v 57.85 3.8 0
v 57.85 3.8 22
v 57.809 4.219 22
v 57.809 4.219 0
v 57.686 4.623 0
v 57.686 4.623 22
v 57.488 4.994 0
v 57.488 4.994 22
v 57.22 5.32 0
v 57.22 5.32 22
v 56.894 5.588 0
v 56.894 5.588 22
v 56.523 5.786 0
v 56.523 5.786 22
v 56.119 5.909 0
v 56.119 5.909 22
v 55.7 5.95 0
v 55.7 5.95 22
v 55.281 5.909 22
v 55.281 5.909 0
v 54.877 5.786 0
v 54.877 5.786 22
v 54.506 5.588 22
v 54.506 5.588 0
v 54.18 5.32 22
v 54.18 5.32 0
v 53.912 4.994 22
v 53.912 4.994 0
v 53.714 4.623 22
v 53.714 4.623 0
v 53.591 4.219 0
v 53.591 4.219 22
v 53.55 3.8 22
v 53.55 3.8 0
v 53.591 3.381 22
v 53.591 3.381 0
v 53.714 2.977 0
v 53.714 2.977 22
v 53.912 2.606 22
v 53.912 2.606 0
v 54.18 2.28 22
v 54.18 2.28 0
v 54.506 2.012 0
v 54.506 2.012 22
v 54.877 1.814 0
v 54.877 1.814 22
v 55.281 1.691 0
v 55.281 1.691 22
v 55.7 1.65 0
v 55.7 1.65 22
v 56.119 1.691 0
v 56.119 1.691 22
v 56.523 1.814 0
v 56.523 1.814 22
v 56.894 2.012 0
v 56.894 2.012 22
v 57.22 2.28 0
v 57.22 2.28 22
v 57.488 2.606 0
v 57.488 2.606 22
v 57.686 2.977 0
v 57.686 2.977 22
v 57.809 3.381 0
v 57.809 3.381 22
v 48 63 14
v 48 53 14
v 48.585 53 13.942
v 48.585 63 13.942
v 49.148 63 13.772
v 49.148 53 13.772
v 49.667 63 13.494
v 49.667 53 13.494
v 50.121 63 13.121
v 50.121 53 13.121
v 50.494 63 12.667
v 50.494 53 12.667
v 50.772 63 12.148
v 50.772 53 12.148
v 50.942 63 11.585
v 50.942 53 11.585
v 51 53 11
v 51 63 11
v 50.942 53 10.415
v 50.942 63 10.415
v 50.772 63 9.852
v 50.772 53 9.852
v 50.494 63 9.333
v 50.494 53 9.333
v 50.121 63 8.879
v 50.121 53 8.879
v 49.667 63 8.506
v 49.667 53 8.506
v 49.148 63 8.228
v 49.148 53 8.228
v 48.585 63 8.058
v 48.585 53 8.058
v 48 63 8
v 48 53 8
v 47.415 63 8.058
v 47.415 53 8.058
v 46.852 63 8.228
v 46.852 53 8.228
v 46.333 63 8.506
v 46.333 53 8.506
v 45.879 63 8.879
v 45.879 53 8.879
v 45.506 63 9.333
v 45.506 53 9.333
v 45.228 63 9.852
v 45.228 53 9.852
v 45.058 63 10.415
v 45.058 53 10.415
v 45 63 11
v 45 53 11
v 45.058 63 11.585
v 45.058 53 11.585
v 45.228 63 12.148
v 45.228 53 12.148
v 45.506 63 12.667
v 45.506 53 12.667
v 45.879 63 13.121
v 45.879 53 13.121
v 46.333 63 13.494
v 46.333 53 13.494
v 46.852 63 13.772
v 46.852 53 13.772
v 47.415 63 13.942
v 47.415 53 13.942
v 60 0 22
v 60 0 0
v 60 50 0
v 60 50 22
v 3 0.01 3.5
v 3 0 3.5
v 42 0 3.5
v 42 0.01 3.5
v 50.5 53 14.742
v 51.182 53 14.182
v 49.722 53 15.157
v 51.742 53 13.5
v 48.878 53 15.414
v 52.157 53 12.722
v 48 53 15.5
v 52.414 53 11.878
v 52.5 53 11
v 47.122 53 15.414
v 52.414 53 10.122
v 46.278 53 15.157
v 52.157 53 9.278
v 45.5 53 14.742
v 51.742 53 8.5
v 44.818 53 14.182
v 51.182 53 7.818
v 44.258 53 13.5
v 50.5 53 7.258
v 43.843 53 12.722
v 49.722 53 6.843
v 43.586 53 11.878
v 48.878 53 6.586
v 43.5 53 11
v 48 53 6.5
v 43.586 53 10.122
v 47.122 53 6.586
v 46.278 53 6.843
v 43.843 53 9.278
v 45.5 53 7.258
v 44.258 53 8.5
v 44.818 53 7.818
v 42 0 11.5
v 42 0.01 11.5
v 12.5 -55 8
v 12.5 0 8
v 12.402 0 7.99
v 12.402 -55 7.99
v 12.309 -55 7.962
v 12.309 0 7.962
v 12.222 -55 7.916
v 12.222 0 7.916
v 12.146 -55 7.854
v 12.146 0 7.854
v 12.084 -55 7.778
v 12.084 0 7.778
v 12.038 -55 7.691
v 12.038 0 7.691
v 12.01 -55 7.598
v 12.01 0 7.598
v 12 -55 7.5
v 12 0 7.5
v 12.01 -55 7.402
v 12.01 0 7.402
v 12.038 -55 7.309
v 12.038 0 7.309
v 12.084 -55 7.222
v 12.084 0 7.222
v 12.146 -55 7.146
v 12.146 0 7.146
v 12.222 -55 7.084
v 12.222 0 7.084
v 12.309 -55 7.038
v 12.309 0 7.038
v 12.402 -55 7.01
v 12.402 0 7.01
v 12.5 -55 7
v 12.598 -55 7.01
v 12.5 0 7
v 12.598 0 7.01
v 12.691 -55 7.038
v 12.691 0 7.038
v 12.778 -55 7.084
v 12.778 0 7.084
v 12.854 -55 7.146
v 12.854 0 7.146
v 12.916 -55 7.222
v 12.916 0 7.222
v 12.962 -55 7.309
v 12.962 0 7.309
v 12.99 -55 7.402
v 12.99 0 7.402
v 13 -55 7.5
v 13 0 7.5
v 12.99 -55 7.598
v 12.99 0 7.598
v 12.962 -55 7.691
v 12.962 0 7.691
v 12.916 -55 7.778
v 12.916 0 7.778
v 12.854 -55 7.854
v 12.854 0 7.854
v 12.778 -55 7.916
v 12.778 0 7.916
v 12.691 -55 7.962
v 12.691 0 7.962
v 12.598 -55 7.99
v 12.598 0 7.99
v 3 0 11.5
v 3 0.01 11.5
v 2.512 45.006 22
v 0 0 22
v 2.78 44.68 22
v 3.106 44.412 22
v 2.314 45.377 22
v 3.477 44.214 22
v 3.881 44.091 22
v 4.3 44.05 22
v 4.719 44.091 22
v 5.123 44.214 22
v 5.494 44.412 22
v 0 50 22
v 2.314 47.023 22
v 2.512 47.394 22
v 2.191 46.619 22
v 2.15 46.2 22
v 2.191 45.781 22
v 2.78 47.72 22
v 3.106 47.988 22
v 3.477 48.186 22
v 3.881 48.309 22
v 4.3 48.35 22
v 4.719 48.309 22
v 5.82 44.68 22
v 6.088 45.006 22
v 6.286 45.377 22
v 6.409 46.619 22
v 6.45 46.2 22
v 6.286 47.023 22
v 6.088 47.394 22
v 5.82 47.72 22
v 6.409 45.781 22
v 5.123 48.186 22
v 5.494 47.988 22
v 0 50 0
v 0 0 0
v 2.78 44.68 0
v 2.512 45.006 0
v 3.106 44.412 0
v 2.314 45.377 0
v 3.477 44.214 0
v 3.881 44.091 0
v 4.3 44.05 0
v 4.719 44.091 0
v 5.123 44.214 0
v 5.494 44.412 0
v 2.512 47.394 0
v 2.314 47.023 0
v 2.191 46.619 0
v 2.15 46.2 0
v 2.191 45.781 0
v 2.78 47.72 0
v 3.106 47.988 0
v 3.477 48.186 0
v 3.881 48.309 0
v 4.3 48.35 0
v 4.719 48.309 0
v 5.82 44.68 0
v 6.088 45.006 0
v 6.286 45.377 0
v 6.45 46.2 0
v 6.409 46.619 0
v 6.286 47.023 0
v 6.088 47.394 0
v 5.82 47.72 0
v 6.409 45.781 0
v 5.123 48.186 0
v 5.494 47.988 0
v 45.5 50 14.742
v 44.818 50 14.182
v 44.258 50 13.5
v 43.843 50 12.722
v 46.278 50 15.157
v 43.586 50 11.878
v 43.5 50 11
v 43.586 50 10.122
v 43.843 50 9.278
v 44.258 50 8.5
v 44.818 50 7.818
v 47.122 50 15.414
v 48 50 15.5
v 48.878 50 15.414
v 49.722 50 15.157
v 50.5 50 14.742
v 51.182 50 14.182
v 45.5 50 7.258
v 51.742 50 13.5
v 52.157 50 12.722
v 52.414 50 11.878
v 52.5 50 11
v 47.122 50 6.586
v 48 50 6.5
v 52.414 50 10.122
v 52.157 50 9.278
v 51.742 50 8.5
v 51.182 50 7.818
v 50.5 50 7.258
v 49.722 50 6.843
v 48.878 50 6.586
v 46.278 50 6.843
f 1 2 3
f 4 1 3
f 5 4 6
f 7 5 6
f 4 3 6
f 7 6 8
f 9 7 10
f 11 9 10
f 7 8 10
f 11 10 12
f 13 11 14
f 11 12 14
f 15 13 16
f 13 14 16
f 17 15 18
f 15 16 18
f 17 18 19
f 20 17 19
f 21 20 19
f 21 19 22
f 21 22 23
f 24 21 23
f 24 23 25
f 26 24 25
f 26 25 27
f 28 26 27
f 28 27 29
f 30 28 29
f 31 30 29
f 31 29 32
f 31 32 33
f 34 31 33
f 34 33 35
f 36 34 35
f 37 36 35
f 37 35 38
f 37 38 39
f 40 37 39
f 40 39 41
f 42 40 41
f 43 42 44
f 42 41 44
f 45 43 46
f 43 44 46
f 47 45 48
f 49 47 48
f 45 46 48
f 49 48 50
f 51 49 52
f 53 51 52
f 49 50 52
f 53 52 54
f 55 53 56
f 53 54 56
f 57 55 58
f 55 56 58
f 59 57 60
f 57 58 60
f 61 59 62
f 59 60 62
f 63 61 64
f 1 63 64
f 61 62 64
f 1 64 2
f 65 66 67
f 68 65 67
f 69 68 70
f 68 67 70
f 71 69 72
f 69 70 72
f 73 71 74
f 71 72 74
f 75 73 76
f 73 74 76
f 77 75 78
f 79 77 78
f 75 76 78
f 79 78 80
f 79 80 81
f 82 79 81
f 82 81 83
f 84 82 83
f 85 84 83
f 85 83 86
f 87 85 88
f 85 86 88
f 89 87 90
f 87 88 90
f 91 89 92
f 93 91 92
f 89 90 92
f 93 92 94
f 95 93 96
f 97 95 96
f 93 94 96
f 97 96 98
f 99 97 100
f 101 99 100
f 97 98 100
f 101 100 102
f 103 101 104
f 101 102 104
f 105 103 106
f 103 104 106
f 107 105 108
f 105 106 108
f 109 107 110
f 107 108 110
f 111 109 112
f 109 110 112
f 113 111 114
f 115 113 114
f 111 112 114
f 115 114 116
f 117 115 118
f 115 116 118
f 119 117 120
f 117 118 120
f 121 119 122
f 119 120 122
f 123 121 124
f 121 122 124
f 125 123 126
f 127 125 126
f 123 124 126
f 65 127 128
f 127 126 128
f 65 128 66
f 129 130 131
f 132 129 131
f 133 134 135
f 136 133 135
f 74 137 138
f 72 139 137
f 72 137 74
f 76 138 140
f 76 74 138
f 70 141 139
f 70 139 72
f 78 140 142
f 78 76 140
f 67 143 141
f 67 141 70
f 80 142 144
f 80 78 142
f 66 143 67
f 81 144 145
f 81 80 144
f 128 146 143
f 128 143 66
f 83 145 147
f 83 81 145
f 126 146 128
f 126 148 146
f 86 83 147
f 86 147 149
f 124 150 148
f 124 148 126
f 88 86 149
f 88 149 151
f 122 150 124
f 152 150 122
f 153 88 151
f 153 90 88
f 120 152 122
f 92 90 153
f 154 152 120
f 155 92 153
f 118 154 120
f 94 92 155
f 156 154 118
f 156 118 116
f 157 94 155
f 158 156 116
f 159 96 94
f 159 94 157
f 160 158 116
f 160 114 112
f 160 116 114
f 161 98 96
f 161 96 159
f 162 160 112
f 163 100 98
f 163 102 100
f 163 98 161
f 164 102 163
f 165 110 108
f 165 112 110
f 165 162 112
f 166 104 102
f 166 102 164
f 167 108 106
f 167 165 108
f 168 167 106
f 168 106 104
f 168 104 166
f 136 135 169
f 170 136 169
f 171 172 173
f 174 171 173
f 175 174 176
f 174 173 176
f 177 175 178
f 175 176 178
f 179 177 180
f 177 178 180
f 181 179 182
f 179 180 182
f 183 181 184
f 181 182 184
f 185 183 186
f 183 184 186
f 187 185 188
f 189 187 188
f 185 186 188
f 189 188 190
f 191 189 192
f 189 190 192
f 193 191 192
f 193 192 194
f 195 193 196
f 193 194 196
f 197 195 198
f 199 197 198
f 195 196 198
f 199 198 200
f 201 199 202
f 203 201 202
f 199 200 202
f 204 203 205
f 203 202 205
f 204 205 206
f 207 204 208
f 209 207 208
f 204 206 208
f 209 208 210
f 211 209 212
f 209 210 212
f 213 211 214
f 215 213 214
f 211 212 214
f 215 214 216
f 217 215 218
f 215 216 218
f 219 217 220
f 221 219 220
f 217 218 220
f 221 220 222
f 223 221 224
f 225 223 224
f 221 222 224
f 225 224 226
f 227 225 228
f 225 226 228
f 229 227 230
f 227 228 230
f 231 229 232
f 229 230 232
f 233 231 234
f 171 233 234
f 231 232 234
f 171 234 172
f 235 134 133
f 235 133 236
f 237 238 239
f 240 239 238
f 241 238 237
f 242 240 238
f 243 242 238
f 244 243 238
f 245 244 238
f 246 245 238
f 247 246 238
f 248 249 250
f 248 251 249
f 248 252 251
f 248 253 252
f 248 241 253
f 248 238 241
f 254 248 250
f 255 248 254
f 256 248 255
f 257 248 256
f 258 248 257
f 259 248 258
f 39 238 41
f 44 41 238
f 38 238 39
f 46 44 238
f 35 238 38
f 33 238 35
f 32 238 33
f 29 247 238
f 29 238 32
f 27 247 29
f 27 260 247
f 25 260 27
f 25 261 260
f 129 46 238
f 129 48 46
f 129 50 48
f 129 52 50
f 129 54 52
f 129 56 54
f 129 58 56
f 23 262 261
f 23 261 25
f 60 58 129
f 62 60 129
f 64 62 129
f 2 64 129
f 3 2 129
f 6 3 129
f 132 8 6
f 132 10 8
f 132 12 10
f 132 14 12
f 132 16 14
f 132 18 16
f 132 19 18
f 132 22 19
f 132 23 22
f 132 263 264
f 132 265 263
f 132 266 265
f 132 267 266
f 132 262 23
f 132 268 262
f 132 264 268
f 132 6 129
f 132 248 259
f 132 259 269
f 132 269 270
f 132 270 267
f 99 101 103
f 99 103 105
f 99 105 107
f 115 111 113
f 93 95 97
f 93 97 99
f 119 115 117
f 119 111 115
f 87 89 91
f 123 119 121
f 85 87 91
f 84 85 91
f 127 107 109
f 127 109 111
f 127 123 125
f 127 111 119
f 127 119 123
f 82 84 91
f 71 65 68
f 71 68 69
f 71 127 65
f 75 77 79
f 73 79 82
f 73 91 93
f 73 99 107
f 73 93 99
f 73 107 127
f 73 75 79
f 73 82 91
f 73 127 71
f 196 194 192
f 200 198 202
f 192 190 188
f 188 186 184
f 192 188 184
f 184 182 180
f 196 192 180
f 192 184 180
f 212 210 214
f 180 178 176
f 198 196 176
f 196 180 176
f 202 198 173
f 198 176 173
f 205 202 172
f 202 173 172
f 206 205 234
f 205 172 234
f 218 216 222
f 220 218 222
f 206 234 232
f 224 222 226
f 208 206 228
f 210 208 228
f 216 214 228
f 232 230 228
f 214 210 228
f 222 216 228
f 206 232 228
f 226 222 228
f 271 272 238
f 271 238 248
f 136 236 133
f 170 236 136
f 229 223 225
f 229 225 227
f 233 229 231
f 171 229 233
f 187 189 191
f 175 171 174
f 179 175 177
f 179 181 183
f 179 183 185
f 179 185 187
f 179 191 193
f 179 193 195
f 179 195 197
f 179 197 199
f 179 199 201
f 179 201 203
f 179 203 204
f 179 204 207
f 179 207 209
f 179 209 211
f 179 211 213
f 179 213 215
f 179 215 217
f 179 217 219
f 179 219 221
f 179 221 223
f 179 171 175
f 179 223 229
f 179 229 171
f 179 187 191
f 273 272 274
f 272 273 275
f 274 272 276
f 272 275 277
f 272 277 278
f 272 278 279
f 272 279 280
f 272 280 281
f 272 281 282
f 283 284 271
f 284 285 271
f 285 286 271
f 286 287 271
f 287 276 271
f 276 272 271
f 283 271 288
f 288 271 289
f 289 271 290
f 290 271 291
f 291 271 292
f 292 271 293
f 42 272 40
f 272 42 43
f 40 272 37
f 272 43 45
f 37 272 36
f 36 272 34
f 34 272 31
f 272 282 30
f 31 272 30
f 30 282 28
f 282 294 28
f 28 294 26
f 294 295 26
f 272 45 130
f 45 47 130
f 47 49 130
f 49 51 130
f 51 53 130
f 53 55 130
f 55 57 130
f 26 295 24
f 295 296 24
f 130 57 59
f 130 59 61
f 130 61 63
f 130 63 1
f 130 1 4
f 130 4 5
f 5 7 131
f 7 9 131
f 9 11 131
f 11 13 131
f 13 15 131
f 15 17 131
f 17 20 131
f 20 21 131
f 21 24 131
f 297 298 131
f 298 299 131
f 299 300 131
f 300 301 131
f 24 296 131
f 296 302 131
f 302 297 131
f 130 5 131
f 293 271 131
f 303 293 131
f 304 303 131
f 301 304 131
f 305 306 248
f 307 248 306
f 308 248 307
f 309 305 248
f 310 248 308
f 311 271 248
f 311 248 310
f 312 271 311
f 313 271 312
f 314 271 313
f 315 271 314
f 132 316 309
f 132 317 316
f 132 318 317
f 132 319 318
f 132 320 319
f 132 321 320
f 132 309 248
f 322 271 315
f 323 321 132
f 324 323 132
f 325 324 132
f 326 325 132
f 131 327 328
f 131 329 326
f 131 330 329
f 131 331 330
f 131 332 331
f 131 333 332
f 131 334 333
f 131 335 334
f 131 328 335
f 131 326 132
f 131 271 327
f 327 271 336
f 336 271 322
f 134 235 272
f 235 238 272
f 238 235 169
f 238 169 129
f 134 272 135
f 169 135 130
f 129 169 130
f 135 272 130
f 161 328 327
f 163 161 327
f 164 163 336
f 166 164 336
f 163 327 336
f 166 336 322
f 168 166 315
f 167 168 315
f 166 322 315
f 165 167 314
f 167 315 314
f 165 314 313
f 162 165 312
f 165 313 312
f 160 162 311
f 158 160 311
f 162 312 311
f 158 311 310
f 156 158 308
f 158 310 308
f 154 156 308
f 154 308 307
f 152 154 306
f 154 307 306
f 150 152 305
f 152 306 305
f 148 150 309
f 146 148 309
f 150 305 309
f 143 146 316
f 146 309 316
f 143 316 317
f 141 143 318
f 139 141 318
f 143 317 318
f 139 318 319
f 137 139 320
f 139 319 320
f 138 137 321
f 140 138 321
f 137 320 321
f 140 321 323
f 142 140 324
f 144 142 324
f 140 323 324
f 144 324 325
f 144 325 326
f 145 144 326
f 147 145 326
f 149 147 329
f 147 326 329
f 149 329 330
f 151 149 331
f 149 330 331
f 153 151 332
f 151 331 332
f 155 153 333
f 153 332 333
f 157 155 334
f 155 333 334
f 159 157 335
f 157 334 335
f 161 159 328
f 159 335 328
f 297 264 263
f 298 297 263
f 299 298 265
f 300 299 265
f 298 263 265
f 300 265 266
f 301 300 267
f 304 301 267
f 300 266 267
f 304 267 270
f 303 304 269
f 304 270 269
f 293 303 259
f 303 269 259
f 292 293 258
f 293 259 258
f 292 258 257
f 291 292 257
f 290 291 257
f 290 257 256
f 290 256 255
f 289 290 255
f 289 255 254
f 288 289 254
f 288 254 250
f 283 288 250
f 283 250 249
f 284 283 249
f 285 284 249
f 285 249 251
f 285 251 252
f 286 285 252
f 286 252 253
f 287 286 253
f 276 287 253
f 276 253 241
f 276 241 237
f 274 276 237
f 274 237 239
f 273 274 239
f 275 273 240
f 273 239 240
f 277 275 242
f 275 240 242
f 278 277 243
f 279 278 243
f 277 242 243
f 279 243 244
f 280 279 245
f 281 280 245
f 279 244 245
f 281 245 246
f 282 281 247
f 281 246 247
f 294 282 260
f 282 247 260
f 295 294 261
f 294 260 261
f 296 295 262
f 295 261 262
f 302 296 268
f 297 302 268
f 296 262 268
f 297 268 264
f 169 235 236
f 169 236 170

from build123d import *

# Parameters (mm, degrees)
SKETCH_1_W          = 60
SKETCH_1_H          = 50
EXTRUDE_1_DEPTH     = 22
SKETCH_2_R          = 4.5
EXTRUDE_2_DEPTH     = 3
SKETCH_3_R          = 3
EXTRUDE_3_DEPTH     = 10
SKETCH_4_R          = 0.5
EXTRUDE_4_DEPTH     = 55
SKETCH_5_W          = 39
SKETCH_5_H          = 8
CUT_EXTRUDE_1_DEPTH = 0.01
SKETCH_6_R          = 2.15
CUT_EXTRUDE_2_DEPTH = 90.738509014


with BuildPart() as part:
    # 草图1 → 凸台-拉伸1 (new body)
    with BuildSketch(Plane.XY):
        with Locations((30, 25)):
            Rectangle(SKETCH_1_W, SKETCH_1_H)
    extrude(amount=EXTRUDE_1_DEPTH)

    # 草图2 → 凸台-拉伸2 (add)
    with BuildSketch(Plane(origin=(0, 50, 0), x_dir=(1, 0, 0), z_dir=(0, 1, 0))):
        with Locations(Location((48, -11, 0), (0, 0, 90))):
            Circle(SKETCH_2_R)
    extrude(amount=EXTRUDE_2_DEPTH)

    # 草图3 → 凸台-拉伸3 (add)
    with BuildSketch(Plane(origin=(0, 53, 0), x_dir=(1, 0, 0), z_dir=(0, 1, 0))):
        with Locations(Location((48, -11, 0), (0, 0, 270))):
            Circle(SKETCH_3_R)
    extrude(amount=EXTRUDE_3_DEPTH)

    # 草图4 → 凸台-拉伸4 (add)
    with BuildSketch(Plane.XZ):
        with Locations(Location((12.5, 7.5, 0), (0, 0, 90))):
            Circle(SKETCH_4_R)
    extrude(amount=EXTRUDE_4_DEPTH)

    # 草图5 → 切除-拉伸1 (cut)
    with BuildSketch(Plane.XZ):
        with Locations((22.5, 7.5)):
            Rectangle(SKETCH_5_W, SKETCH_5_H)
    extrude(amount=-CUT_EXTRUDE_1_DEPTH, mode=Mode.SUBTRACT)


with BuildPart() as cut_extrude_1_piece_1:
    # of the separate pieces the step leaves, piece 1, a body of its own (cut_extrude_1_pieces)
    add(part.part.solids().sort_by_distance((0, 0, 0))[0])

    # 草图6 → 切除-拉伸2 (cut, through all)
    with BuildSketch(Plane.XY.offset(22)):
        with Locations((55.7, 3.8)):
            Circle(SKETCH_6_R)
        with Locations((4.3, 46.2)):
            Circle(SKETCH_6_R)
    extrude(amount=-CUT_EXTRUDE_2_DEPTH, mode=Mode.SUBTRACT)


with BuildPart() as cut_extrude_1_piece_2:
    # of the separate pieces the step leaves, piece 2, a body of its own (cut_extrude_1_pieces)
    add(part.part.solids().sort_by_distance((12.5, 0, 8))[0])


solid = Compound([cut_extrude_1_piece_1.part, cut_extrude_1_piece_2.part])
